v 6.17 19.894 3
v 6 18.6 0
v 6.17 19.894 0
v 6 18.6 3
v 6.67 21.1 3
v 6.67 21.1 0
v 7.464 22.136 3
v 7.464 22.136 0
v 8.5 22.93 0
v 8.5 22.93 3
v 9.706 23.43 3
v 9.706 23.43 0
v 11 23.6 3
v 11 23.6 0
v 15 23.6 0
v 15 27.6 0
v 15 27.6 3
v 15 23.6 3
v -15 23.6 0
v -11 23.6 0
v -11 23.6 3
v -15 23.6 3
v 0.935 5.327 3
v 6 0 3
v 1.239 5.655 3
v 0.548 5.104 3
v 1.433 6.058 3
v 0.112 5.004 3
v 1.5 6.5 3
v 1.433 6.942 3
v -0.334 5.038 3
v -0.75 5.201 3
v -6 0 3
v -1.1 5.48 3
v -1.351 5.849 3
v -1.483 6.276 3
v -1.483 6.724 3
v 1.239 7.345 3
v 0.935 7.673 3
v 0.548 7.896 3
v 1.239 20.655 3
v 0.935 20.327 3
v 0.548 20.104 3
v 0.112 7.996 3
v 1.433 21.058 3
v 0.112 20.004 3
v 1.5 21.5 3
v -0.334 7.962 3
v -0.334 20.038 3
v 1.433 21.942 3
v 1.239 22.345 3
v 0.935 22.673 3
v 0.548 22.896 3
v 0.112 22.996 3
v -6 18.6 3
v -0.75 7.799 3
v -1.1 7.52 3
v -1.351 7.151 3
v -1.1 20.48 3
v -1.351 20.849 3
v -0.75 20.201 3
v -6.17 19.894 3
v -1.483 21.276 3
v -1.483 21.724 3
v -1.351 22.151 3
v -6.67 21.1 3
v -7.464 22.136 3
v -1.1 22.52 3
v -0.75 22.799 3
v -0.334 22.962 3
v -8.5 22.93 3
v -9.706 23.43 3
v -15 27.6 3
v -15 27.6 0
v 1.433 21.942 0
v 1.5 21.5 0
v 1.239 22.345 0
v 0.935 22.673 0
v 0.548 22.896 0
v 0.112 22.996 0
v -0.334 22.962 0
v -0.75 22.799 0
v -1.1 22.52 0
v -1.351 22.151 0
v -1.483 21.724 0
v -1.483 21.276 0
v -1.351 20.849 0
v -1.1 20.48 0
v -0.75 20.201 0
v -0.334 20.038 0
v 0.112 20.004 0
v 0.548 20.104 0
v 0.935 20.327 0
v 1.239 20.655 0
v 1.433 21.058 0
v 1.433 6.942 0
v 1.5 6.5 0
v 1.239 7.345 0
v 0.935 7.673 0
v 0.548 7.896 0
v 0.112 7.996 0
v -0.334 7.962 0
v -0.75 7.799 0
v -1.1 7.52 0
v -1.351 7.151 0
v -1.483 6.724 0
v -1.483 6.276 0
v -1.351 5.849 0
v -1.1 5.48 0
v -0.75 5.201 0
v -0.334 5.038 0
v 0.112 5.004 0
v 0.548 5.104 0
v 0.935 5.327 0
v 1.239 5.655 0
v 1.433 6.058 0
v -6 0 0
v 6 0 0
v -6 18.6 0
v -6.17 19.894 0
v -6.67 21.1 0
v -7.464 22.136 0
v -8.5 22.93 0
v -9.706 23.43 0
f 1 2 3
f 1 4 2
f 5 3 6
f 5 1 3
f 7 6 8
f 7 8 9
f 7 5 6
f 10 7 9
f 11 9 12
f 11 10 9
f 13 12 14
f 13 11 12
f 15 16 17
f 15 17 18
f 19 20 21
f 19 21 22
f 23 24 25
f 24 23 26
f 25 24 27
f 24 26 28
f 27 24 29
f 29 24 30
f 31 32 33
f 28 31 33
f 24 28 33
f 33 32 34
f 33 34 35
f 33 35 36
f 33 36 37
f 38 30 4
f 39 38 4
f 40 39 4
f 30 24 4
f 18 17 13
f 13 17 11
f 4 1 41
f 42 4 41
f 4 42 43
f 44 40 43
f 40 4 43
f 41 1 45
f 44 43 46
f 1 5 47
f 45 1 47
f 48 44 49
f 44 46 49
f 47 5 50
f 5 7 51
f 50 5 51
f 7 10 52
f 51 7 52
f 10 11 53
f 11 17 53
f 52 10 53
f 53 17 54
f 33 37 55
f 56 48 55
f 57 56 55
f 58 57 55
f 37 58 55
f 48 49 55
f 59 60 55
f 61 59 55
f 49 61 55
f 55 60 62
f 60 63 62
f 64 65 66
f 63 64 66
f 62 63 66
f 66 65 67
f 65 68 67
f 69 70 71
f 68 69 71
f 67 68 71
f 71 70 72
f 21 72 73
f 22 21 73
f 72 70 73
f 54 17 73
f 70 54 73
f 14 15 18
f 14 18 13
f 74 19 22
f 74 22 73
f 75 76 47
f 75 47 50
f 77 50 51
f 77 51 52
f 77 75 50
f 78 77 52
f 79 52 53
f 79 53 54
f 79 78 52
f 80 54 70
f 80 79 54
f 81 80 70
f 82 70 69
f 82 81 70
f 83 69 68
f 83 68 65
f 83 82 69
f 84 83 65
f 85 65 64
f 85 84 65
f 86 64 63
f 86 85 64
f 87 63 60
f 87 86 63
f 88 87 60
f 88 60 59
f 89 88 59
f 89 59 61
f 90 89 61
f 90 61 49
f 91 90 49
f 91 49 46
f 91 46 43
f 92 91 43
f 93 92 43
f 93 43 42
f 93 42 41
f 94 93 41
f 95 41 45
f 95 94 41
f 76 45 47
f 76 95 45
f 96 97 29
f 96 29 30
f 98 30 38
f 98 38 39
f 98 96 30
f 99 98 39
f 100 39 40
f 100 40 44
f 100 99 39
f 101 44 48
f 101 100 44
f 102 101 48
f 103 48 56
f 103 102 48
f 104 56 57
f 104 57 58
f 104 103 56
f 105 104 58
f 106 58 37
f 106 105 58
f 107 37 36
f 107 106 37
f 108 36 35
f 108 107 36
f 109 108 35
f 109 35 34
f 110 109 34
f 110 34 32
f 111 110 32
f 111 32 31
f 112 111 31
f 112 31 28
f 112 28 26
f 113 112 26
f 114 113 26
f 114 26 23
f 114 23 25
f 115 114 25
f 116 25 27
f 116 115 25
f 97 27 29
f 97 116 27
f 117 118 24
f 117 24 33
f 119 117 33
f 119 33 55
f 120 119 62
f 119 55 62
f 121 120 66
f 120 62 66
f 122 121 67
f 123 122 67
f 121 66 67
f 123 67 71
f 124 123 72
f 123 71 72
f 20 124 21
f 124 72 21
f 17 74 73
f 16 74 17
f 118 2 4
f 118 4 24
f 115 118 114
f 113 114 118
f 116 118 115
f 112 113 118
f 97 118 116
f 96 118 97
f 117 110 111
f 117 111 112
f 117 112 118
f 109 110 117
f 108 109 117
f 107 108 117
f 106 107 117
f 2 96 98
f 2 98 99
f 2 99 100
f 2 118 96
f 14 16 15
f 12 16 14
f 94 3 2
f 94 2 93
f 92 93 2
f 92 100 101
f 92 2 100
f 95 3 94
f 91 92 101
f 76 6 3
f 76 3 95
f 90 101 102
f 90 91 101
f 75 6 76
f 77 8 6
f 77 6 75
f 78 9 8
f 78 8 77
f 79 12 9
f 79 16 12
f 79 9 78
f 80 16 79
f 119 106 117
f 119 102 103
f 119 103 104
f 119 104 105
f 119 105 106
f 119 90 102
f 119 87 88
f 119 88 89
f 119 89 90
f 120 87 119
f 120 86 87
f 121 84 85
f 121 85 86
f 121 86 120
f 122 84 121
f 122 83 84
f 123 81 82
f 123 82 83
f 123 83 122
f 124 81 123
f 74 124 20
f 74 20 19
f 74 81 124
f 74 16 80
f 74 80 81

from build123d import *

# Parameters (mm, degrees)
SKETCH1_R           = 1.5
BOSS_EXTRUDE1_DEPTH = 3
FILLET1_R           = 5
FILLET2_R           = 5


with BuildPart() as part:
    # Sketch1 → Boss-Extrude1 (new body)
    with BuildSketch(Plane.XY):
        Polygon((6, 0), (-6, 0), (-6, 23.6), (-15, 23.6), (-15, 27.6), (15, 27.6), (15, 23.6), (6, 23.6), align=None)
        with Locations((0, 6.5)):
            Circle(SKETCH1_R, mode=Mode.SUBTRACT)
        with Locations((0, 21.5)):
            Circle(SKETCH1_R, mode=Mode.SUBTRACT)
    extrude(amount=BOSS_EXTRUDE1_DEPTH)

    # Fillet1
    fillet1_edges = [part.edges().sort_by_distance(p)[0] for p in [
        (-6, 23.6, 1.5),
    ]]
    fillet(fillet1_edges, radius=FILLET1_R)

    # Fillet2
    fillet2_edges = [part.edges().sort_by_distance(p)[0] for p in [
        (6, 23.6, 1.5),
    ]]
    fillet(fillet2_edges, radius=FILLET2_R)


solid = part.part
